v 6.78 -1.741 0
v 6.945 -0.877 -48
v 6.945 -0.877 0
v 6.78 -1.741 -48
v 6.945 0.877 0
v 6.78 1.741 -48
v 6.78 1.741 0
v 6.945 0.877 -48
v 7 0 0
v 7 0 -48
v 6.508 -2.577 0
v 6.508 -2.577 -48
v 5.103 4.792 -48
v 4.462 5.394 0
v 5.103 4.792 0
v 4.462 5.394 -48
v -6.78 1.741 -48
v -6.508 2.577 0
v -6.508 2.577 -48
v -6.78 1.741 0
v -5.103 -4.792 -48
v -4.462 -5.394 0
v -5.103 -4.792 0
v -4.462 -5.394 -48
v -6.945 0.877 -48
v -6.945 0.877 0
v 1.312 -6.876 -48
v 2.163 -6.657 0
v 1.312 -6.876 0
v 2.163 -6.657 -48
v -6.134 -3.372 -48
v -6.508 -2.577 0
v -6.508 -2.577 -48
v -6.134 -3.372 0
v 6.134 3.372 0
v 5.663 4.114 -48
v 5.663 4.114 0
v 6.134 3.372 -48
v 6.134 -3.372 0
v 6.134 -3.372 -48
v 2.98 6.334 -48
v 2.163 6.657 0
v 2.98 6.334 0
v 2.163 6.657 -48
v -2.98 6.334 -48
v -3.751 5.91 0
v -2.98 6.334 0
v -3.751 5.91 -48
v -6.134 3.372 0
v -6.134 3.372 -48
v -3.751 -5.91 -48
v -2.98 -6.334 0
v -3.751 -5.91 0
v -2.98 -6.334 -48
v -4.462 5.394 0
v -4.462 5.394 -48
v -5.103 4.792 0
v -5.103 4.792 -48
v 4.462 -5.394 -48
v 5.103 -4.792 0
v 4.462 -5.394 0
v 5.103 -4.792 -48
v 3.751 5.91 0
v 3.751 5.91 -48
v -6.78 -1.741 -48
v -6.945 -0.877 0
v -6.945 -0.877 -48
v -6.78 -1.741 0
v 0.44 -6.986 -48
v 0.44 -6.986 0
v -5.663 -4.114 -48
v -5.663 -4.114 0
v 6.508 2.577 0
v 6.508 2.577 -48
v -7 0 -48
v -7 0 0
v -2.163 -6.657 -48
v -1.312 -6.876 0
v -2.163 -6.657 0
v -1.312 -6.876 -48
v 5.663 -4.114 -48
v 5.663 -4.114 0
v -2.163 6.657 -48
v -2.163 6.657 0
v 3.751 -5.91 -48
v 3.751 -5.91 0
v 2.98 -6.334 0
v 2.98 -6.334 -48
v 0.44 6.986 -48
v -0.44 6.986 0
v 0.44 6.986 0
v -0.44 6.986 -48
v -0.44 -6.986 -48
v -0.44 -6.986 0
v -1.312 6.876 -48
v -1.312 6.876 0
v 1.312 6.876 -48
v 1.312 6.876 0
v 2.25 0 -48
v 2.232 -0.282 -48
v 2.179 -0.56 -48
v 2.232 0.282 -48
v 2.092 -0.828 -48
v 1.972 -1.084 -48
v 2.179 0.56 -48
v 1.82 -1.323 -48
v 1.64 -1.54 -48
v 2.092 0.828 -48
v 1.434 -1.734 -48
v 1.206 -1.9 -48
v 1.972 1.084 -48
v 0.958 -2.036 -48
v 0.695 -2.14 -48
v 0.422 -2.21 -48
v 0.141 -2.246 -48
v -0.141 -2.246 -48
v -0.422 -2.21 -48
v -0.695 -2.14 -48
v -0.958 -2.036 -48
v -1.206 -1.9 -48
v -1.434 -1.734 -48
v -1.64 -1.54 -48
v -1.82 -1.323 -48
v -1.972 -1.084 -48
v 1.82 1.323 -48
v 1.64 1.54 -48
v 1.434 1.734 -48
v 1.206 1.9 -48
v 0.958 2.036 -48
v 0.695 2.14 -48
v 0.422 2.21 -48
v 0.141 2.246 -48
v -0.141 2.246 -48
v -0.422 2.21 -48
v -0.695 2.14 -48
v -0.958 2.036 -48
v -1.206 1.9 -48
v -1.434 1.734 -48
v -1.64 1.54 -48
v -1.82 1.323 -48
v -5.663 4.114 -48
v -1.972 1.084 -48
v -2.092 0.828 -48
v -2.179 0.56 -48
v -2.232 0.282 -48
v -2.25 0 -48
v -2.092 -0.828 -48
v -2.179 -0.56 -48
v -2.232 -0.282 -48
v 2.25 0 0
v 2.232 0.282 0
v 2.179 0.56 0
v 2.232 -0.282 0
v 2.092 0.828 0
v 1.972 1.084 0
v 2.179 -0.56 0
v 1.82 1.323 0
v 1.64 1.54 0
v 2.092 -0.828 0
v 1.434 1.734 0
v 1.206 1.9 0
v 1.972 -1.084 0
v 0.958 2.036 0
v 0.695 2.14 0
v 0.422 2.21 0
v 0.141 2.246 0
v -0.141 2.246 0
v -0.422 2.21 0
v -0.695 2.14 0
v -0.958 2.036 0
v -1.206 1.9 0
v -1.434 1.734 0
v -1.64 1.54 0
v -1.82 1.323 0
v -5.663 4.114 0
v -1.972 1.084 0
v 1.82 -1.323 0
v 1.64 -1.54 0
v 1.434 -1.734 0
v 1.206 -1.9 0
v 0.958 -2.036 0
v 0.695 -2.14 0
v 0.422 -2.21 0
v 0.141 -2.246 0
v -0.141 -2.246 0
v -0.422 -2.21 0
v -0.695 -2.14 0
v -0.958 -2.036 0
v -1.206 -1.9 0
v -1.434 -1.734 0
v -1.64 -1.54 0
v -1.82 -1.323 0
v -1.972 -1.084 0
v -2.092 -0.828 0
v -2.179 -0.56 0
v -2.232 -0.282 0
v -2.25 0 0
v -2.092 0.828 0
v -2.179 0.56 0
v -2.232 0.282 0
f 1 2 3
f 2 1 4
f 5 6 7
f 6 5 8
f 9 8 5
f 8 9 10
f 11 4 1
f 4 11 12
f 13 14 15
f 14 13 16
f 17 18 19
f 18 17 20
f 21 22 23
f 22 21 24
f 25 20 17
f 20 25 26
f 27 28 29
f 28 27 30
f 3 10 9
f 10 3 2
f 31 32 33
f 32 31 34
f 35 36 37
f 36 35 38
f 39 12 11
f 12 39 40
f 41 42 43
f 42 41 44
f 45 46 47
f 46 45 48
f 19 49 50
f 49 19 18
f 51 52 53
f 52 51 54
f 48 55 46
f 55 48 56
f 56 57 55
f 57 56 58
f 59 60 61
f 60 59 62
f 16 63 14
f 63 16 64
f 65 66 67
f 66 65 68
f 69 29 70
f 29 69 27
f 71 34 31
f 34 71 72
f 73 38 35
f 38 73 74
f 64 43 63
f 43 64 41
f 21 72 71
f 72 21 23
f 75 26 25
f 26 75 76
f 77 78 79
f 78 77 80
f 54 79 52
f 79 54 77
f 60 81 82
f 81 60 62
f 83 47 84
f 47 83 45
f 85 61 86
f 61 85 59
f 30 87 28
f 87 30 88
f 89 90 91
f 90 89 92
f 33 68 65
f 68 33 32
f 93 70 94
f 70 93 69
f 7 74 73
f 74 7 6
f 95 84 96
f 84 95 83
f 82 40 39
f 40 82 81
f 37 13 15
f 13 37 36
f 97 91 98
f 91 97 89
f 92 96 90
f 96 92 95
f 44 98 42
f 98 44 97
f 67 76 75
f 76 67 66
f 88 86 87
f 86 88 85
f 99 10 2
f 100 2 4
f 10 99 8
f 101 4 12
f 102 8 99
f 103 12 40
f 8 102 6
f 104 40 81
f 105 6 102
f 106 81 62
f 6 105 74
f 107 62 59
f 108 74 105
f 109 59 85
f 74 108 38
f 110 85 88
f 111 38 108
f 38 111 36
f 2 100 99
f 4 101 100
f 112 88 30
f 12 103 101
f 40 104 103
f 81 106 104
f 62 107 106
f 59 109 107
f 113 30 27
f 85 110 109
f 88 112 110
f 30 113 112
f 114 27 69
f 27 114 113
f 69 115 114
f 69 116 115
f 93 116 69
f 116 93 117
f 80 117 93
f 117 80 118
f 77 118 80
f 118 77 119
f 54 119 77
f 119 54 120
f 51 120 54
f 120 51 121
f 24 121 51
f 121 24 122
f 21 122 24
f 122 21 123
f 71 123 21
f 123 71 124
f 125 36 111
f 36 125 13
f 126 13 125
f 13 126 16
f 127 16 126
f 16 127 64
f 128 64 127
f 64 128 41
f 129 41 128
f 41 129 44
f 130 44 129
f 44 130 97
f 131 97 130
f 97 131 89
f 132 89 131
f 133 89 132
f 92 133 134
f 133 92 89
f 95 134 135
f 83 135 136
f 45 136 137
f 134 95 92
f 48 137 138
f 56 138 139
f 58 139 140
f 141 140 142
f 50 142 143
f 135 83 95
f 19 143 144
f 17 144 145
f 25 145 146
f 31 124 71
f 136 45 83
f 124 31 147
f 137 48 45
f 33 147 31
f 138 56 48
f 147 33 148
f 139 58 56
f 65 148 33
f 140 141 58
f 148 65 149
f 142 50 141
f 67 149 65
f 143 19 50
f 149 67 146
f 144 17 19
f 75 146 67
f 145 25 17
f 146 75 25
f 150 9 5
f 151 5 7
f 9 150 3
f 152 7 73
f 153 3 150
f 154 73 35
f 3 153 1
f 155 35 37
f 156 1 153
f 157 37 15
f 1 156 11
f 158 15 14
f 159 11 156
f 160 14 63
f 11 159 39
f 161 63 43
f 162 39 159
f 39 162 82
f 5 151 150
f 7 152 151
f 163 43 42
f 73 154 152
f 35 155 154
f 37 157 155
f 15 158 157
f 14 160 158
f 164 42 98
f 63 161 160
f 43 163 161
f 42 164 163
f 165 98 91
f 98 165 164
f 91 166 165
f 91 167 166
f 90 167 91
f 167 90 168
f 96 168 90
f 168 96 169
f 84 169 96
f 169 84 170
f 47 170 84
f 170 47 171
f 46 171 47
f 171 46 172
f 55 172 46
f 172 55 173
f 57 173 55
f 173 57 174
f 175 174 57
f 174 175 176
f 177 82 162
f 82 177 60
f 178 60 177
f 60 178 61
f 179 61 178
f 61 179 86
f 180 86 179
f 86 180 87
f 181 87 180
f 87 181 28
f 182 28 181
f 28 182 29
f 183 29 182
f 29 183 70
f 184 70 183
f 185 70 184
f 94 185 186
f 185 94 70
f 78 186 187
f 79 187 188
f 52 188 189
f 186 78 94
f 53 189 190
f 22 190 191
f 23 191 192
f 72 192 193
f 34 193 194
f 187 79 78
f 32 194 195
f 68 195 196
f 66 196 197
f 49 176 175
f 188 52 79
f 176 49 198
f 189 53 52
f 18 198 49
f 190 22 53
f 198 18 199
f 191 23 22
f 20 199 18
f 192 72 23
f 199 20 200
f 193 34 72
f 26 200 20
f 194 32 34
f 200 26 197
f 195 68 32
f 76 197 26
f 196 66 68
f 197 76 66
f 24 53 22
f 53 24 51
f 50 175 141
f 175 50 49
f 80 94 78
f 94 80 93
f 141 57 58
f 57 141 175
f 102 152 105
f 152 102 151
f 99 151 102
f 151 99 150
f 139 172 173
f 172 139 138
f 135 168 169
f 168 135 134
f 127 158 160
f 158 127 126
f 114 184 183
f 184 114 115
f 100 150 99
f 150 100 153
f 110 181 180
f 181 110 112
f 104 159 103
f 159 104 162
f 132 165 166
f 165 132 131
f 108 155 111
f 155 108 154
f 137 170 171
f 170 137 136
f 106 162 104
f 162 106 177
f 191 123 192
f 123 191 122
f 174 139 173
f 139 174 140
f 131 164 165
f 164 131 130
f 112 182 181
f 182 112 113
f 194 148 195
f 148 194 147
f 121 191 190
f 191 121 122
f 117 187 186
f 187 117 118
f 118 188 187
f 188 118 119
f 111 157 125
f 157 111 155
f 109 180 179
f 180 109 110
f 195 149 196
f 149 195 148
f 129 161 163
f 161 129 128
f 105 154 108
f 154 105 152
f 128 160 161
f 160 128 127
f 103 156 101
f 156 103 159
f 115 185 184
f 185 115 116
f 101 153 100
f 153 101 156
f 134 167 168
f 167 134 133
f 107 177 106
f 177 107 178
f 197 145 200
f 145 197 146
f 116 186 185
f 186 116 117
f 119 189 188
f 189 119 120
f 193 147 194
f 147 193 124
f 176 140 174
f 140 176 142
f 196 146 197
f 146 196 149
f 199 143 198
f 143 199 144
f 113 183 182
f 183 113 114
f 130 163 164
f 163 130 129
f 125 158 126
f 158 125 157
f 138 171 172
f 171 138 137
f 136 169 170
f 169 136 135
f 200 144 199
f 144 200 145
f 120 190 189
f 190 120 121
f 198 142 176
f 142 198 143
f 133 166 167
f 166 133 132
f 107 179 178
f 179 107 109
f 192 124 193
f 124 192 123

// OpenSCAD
$fn = 50;


difference() {
	union() {
		translate(v = [0, 0, -48.0000000000]) {
			cylinder(h = 48, r = 7.0000000000);
		}
	}
	union() {
		#translate(v = [0, 0, -48]) {
			cylinder(h = 48, r = 2.2500000000);
		}
	}
}
